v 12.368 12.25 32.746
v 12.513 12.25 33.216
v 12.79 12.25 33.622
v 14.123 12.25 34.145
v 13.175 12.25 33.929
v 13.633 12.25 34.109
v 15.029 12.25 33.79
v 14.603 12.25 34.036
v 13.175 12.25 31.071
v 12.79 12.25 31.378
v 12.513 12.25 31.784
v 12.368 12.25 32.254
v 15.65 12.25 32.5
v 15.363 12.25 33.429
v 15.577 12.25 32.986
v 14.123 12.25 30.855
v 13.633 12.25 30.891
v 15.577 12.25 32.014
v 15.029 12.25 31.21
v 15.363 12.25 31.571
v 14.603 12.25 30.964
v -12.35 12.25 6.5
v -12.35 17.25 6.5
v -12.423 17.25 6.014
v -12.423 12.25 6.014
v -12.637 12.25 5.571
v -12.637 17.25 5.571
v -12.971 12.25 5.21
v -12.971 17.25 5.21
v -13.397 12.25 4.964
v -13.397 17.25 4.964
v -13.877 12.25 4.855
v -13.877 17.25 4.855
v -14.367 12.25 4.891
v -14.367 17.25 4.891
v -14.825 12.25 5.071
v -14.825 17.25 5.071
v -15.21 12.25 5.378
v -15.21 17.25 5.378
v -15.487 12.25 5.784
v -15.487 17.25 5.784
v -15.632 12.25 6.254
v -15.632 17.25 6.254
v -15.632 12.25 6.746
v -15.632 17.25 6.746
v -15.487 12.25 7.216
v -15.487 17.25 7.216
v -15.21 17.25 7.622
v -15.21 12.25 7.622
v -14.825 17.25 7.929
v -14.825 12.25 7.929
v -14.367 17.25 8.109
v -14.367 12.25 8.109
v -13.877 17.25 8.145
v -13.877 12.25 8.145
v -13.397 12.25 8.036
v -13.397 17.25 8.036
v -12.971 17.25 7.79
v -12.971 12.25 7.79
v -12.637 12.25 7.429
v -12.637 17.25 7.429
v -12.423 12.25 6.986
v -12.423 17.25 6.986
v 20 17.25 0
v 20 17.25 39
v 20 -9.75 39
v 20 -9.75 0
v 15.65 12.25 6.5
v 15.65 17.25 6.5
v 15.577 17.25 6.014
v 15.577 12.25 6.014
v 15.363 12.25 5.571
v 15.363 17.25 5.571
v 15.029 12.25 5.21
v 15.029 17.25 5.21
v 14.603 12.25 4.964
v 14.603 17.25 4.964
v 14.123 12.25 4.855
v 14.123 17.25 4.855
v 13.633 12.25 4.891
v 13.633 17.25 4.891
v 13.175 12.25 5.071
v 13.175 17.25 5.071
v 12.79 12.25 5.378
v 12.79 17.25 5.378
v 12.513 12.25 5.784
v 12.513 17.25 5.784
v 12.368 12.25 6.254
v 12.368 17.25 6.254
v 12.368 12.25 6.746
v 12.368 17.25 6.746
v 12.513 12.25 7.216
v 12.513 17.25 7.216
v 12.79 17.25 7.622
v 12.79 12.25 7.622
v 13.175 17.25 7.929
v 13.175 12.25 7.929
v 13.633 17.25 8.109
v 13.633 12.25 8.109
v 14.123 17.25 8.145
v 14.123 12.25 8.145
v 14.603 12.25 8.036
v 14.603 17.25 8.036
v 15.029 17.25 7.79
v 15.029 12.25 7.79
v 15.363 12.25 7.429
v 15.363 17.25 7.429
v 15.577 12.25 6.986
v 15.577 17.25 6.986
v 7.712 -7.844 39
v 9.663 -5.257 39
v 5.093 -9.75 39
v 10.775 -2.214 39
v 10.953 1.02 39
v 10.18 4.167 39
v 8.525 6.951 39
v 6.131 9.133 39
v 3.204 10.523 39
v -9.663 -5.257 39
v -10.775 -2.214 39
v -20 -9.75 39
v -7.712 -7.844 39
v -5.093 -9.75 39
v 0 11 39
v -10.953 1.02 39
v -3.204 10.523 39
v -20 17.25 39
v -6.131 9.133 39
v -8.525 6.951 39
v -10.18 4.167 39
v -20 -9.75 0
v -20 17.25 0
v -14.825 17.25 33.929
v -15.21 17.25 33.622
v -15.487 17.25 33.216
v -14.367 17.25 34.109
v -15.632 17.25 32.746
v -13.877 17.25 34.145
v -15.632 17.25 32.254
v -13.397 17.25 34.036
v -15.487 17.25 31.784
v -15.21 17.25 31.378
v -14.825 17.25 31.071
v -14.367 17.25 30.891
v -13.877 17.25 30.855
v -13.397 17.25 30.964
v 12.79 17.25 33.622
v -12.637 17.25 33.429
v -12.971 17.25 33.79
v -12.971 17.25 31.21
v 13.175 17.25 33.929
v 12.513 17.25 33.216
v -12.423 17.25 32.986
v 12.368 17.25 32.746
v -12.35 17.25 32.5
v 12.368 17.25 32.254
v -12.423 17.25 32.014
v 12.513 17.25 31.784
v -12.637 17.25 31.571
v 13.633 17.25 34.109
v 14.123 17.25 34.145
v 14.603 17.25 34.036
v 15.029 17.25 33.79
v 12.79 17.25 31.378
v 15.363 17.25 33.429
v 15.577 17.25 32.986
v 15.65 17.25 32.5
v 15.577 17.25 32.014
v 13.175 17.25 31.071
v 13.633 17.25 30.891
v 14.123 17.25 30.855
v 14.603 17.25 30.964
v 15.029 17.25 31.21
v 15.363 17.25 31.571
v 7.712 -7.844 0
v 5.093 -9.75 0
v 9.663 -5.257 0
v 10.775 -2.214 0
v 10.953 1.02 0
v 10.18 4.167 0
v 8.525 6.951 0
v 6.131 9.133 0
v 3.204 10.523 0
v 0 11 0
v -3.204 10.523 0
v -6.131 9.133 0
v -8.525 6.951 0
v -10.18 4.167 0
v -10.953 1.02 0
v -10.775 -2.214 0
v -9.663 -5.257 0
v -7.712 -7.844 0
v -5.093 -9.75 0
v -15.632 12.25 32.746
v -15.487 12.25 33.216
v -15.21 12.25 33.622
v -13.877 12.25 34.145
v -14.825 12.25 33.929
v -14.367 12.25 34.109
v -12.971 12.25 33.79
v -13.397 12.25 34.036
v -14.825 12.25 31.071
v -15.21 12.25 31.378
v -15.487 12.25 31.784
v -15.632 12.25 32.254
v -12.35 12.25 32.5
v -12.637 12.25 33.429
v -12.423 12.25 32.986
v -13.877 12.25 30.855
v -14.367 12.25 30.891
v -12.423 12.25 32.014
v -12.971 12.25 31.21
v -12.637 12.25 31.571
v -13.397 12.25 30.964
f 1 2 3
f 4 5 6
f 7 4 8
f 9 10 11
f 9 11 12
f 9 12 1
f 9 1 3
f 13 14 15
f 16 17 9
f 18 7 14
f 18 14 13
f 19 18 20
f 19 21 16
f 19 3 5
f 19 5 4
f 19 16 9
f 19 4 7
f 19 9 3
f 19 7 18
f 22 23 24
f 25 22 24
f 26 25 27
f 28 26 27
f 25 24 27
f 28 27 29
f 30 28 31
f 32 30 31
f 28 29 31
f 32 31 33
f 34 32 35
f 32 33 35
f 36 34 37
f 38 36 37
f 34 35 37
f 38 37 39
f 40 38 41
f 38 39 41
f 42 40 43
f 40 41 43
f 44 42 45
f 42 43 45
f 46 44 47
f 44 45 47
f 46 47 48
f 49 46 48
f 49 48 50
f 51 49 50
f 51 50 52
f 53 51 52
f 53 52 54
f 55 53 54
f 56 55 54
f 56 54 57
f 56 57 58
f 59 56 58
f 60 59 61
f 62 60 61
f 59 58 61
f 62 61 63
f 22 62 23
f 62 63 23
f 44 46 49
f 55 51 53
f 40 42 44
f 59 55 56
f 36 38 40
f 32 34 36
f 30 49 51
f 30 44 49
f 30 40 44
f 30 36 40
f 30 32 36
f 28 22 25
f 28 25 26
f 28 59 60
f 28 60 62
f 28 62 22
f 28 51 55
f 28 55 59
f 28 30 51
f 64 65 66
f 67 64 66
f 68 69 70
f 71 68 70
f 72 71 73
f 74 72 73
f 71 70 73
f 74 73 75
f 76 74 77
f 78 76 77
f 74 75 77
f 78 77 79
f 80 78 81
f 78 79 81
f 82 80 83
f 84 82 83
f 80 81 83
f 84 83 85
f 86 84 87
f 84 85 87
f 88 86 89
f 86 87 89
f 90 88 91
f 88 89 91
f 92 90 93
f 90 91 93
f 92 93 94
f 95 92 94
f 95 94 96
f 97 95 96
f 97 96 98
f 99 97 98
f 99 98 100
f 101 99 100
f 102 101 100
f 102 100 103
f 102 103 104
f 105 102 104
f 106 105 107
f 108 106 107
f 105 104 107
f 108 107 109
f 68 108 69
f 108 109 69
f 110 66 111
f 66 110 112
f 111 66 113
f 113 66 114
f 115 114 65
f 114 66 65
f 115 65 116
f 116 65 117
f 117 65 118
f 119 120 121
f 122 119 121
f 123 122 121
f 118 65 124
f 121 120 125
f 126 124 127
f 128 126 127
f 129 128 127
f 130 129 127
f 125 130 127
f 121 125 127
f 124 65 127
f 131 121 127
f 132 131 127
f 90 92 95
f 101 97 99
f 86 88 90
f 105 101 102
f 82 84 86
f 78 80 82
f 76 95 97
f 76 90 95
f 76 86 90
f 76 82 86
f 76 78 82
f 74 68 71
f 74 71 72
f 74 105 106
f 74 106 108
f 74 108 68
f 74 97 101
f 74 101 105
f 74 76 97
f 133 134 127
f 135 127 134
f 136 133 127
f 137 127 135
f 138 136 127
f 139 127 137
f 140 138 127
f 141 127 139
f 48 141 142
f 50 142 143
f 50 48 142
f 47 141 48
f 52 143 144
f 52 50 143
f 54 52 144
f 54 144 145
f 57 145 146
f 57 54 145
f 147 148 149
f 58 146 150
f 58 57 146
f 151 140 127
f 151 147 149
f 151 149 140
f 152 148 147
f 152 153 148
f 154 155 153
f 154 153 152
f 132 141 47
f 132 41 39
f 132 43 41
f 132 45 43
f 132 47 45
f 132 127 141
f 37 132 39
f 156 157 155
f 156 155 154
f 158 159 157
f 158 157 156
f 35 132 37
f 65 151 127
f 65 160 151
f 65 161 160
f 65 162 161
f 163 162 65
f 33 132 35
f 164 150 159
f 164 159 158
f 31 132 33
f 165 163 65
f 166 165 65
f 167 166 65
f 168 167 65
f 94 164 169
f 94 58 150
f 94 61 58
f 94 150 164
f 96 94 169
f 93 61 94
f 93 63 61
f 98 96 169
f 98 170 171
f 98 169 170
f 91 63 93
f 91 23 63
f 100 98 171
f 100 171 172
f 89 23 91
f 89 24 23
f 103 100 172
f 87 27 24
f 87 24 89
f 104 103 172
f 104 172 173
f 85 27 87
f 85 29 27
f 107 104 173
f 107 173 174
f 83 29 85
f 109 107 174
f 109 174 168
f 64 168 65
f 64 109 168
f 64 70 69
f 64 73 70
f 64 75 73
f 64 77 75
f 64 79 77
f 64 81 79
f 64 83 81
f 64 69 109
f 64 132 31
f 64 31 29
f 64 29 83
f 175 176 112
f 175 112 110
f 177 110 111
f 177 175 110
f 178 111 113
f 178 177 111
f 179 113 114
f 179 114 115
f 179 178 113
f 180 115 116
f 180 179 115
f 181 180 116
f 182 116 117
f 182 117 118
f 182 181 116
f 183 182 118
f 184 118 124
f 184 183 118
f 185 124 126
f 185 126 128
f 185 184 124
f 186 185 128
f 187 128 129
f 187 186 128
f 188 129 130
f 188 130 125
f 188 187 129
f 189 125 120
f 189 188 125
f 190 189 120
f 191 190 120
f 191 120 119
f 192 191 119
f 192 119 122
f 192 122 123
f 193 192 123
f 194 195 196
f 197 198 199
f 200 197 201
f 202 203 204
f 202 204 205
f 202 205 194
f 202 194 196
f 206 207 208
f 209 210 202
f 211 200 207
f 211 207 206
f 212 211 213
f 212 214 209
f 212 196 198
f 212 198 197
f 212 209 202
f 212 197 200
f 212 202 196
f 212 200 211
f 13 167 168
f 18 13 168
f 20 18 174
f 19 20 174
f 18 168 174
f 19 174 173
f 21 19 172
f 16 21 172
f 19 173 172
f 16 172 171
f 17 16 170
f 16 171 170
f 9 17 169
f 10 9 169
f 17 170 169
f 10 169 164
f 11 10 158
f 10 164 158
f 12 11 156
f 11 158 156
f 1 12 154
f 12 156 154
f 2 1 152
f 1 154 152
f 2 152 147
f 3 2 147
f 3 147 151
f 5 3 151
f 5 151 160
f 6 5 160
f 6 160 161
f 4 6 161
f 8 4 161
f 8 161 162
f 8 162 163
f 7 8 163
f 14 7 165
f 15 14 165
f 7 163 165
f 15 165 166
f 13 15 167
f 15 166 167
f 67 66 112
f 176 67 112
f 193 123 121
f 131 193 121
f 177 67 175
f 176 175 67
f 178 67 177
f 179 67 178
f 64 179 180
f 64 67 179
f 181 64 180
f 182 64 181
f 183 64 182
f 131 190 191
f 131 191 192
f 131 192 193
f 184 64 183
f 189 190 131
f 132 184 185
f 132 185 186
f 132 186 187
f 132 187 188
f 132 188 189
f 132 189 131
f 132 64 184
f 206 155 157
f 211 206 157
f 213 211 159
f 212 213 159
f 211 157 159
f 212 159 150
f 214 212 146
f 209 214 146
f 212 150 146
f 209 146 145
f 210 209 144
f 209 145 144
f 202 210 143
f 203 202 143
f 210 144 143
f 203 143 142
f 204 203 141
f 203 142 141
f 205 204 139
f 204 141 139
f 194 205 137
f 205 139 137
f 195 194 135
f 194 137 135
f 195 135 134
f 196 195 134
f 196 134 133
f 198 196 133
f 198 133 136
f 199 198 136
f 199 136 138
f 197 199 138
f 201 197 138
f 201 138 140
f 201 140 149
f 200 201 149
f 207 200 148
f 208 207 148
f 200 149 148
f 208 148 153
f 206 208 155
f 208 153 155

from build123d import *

# Parameters (mm, degrees)
BOSS_EXTRUDE1_DEPTH = 39
SKETCH2_R           = 1.65
CUT_EXTRUDE1_DEPTH  = 5


with BuildPart() as part:
    # Sketch1 → Boss-Extrude1 (new body)
    with BuildSketch(Plane.XY):
        with BuildLine():
            Line((-20, 17.25), (20, 17.25))
            Line((20, 17.25), (20, -9.75))
            Line((20, -9.75), (5.092887197, -9.75))
            ThreePointArc((5.092887197, -9.75), (0, 11), (-5.092887197, -9.75))
            Line((-5.092887197, -9.75), (-20, -9.75))
            Line((-20, -9.75), (-20, 17.25))
        make_face()
    extrude(amount=BOSS_EXTRUDE1_DEPTH)

    # Sketch2 → Cut-Extrude1 (cut)
    with BuildSketch(Plane(origin=(0, 17.25, 0), x_dir=(1, 0, 0), z_dir=(0, 1, 0))):
        with Locations((-14, -6.5)):
            Circle(SKETCH2_R)
        with Locations((14, -6.5)):
            Circle(SKETCH2_R)
        with Locations((-14, -32.5)):
            Circle(SKETCH2_R)
        with Locations((14, -32.5)):
            Circle(SKETCH2_R)
    extrude(amount=-CUT_EXTRUDE1_DEPTH, mode=Mode.SUBTRACT)


solid = part.part
